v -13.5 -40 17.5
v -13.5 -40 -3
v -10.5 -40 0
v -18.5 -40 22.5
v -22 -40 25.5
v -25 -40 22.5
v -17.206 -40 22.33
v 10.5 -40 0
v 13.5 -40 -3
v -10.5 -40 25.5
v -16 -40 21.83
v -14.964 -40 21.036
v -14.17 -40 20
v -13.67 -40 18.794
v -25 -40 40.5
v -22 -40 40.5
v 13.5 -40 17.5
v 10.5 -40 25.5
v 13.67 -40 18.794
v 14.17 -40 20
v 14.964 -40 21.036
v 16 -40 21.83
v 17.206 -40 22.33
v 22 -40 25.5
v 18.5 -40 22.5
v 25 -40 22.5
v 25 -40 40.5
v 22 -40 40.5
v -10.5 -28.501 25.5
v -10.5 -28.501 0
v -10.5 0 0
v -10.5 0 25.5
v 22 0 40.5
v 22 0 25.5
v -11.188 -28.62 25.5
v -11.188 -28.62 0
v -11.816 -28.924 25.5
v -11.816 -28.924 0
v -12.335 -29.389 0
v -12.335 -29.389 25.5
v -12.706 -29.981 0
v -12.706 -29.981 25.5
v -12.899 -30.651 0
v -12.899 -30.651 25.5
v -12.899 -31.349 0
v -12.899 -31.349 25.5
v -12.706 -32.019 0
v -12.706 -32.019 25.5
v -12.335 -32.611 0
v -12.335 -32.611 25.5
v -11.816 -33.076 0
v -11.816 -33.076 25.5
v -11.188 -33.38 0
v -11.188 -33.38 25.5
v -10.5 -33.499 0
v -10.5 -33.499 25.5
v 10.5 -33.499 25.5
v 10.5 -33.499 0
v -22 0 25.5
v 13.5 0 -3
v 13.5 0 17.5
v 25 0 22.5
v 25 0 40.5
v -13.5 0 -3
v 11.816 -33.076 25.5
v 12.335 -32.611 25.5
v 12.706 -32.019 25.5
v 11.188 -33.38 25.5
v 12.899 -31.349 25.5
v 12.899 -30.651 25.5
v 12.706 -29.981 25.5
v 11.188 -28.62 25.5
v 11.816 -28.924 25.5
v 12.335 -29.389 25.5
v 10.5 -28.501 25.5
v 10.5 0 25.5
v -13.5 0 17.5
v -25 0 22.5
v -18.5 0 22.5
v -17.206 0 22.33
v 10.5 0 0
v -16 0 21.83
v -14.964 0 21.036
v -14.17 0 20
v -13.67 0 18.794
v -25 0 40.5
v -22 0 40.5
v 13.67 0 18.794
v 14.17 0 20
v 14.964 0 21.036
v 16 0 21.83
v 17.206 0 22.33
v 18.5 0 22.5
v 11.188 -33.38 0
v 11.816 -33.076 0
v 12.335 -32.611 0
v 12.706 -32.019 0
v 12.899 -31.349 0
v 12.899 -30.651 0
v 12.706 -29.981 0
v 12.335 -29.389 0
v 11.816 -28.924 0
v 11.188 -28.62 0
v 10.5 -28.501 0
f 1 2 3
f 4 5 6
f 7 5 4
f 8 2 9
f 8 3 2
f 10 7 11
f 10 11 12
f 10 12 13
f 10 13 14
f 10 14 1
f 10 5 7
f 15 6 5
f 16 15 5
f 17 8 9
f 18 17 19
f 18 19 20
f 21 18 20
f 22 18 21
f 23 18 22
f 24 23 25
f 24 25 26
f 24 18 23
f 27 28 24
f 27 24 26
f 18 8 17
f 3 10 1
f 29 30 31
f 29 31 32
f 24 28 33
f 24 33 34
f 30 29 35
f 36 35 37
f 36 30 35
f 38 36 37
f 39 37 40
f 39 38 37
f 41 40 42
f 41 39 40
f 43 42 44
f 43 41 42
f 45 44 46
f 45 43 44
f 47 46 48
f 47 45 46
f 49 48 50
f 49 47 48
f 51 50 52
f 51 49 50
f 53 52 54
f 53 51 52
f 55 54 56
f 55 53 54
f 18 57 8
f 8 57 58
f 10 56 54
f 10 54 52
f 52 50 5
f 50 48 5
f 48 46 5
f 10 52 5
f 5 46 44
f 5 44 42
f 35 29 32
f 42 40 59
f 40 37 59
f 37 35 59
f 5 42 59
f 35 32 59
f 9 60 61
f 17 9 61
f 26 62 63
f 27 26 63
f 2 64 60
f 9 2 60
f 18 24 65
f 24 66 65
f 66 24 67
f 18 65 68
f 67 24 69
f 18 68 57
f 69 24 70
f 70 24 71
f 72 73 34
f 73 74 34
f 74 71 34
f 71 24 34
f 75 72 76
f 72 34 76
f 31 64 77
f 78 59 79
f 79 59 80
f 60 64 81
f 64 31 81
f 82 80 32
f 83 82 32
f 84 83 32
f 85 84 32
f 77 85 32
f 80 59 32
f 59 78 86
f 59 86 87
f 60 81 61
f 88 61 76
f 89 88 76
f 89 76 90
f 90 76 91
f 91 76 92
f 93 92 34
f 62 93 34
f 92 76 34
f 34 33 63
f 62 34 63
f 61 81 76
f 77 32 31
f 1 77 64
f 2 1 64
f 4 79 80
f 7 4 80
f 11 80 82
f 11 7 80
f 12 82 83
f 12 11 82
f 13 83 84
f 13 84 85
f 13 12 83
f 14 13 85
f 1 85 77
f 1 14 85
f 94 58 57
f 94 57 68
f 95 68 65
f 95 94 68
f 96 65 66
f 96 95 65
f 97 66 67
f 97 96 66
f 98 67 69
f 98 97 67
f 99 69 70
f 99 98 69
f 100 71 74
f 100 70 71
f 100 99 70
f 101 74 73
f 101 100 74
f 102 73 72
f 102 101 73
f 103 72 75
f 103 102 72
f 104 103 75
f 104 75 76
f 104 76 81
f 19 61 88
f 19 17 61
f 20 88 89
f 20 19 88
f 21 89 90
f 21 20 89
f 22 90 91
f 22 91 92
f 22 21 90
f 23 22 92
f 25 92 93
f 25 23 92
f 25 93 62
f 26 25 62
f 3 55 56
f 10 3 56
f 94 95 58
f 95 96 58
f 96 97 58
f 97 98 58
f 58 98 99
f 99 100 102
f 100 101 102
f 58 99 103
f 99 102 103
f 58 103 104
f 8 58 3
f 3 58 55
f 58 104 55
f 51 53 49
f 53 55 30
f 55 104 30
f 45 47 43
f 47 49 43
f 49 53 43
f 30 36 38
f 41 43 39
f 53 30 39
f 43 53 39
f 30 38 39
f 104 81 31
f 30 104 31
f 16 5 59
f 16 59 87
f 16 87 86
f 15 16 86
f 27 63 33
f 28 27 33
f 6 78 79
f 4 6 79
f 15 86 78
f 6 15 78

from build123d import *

# Parameters (mm, degrees)
F1_DEPTH = 40
F2_R     = 5
F3_R     = 2.5
F4_DEPTH = 27


with BuildPart() as f1:
    # F0 (on Front) → F1 (new body)
    with BuildSketch(Plane.XZ):
        Polygon((10.5, 0), (0, 0), (-10.5, 0), (-10.5, 25.5), (-22, 25.5), (-22, 40.5), (-25, 40.5), (-25, 22.5), (-13.5, 22.5), (-13.5, -3), (0, -3), (13.5, -3), (13.5, 22.5), (25, 22.5), (25, 40.5), (22, 40.5), (22, 25.5), (10.5, 25.5), align=None)
    extrude(amount=F1_DEPTH)

    # F2
    f2_edges = [f1.edges().sort_by_distance(p)[0] for p in [
        (-13.5, -20, 22.5),
        (13.5, -20, 22.5),
    ]]
    fillet(f2_edges, radius=F2_R)

    # F3 (on Top) → F4 (cut)
    with BuildSketch(Plane.XY):
        with Locations((-10.423073, -31)):
            Circle(F3_R)
        with Locations((10.423073, -31)):
            Circle(F3_R)
    extrude(amount=F4_DEPTH, mode=Mode.SUBTRACT)


solid = f1.part
